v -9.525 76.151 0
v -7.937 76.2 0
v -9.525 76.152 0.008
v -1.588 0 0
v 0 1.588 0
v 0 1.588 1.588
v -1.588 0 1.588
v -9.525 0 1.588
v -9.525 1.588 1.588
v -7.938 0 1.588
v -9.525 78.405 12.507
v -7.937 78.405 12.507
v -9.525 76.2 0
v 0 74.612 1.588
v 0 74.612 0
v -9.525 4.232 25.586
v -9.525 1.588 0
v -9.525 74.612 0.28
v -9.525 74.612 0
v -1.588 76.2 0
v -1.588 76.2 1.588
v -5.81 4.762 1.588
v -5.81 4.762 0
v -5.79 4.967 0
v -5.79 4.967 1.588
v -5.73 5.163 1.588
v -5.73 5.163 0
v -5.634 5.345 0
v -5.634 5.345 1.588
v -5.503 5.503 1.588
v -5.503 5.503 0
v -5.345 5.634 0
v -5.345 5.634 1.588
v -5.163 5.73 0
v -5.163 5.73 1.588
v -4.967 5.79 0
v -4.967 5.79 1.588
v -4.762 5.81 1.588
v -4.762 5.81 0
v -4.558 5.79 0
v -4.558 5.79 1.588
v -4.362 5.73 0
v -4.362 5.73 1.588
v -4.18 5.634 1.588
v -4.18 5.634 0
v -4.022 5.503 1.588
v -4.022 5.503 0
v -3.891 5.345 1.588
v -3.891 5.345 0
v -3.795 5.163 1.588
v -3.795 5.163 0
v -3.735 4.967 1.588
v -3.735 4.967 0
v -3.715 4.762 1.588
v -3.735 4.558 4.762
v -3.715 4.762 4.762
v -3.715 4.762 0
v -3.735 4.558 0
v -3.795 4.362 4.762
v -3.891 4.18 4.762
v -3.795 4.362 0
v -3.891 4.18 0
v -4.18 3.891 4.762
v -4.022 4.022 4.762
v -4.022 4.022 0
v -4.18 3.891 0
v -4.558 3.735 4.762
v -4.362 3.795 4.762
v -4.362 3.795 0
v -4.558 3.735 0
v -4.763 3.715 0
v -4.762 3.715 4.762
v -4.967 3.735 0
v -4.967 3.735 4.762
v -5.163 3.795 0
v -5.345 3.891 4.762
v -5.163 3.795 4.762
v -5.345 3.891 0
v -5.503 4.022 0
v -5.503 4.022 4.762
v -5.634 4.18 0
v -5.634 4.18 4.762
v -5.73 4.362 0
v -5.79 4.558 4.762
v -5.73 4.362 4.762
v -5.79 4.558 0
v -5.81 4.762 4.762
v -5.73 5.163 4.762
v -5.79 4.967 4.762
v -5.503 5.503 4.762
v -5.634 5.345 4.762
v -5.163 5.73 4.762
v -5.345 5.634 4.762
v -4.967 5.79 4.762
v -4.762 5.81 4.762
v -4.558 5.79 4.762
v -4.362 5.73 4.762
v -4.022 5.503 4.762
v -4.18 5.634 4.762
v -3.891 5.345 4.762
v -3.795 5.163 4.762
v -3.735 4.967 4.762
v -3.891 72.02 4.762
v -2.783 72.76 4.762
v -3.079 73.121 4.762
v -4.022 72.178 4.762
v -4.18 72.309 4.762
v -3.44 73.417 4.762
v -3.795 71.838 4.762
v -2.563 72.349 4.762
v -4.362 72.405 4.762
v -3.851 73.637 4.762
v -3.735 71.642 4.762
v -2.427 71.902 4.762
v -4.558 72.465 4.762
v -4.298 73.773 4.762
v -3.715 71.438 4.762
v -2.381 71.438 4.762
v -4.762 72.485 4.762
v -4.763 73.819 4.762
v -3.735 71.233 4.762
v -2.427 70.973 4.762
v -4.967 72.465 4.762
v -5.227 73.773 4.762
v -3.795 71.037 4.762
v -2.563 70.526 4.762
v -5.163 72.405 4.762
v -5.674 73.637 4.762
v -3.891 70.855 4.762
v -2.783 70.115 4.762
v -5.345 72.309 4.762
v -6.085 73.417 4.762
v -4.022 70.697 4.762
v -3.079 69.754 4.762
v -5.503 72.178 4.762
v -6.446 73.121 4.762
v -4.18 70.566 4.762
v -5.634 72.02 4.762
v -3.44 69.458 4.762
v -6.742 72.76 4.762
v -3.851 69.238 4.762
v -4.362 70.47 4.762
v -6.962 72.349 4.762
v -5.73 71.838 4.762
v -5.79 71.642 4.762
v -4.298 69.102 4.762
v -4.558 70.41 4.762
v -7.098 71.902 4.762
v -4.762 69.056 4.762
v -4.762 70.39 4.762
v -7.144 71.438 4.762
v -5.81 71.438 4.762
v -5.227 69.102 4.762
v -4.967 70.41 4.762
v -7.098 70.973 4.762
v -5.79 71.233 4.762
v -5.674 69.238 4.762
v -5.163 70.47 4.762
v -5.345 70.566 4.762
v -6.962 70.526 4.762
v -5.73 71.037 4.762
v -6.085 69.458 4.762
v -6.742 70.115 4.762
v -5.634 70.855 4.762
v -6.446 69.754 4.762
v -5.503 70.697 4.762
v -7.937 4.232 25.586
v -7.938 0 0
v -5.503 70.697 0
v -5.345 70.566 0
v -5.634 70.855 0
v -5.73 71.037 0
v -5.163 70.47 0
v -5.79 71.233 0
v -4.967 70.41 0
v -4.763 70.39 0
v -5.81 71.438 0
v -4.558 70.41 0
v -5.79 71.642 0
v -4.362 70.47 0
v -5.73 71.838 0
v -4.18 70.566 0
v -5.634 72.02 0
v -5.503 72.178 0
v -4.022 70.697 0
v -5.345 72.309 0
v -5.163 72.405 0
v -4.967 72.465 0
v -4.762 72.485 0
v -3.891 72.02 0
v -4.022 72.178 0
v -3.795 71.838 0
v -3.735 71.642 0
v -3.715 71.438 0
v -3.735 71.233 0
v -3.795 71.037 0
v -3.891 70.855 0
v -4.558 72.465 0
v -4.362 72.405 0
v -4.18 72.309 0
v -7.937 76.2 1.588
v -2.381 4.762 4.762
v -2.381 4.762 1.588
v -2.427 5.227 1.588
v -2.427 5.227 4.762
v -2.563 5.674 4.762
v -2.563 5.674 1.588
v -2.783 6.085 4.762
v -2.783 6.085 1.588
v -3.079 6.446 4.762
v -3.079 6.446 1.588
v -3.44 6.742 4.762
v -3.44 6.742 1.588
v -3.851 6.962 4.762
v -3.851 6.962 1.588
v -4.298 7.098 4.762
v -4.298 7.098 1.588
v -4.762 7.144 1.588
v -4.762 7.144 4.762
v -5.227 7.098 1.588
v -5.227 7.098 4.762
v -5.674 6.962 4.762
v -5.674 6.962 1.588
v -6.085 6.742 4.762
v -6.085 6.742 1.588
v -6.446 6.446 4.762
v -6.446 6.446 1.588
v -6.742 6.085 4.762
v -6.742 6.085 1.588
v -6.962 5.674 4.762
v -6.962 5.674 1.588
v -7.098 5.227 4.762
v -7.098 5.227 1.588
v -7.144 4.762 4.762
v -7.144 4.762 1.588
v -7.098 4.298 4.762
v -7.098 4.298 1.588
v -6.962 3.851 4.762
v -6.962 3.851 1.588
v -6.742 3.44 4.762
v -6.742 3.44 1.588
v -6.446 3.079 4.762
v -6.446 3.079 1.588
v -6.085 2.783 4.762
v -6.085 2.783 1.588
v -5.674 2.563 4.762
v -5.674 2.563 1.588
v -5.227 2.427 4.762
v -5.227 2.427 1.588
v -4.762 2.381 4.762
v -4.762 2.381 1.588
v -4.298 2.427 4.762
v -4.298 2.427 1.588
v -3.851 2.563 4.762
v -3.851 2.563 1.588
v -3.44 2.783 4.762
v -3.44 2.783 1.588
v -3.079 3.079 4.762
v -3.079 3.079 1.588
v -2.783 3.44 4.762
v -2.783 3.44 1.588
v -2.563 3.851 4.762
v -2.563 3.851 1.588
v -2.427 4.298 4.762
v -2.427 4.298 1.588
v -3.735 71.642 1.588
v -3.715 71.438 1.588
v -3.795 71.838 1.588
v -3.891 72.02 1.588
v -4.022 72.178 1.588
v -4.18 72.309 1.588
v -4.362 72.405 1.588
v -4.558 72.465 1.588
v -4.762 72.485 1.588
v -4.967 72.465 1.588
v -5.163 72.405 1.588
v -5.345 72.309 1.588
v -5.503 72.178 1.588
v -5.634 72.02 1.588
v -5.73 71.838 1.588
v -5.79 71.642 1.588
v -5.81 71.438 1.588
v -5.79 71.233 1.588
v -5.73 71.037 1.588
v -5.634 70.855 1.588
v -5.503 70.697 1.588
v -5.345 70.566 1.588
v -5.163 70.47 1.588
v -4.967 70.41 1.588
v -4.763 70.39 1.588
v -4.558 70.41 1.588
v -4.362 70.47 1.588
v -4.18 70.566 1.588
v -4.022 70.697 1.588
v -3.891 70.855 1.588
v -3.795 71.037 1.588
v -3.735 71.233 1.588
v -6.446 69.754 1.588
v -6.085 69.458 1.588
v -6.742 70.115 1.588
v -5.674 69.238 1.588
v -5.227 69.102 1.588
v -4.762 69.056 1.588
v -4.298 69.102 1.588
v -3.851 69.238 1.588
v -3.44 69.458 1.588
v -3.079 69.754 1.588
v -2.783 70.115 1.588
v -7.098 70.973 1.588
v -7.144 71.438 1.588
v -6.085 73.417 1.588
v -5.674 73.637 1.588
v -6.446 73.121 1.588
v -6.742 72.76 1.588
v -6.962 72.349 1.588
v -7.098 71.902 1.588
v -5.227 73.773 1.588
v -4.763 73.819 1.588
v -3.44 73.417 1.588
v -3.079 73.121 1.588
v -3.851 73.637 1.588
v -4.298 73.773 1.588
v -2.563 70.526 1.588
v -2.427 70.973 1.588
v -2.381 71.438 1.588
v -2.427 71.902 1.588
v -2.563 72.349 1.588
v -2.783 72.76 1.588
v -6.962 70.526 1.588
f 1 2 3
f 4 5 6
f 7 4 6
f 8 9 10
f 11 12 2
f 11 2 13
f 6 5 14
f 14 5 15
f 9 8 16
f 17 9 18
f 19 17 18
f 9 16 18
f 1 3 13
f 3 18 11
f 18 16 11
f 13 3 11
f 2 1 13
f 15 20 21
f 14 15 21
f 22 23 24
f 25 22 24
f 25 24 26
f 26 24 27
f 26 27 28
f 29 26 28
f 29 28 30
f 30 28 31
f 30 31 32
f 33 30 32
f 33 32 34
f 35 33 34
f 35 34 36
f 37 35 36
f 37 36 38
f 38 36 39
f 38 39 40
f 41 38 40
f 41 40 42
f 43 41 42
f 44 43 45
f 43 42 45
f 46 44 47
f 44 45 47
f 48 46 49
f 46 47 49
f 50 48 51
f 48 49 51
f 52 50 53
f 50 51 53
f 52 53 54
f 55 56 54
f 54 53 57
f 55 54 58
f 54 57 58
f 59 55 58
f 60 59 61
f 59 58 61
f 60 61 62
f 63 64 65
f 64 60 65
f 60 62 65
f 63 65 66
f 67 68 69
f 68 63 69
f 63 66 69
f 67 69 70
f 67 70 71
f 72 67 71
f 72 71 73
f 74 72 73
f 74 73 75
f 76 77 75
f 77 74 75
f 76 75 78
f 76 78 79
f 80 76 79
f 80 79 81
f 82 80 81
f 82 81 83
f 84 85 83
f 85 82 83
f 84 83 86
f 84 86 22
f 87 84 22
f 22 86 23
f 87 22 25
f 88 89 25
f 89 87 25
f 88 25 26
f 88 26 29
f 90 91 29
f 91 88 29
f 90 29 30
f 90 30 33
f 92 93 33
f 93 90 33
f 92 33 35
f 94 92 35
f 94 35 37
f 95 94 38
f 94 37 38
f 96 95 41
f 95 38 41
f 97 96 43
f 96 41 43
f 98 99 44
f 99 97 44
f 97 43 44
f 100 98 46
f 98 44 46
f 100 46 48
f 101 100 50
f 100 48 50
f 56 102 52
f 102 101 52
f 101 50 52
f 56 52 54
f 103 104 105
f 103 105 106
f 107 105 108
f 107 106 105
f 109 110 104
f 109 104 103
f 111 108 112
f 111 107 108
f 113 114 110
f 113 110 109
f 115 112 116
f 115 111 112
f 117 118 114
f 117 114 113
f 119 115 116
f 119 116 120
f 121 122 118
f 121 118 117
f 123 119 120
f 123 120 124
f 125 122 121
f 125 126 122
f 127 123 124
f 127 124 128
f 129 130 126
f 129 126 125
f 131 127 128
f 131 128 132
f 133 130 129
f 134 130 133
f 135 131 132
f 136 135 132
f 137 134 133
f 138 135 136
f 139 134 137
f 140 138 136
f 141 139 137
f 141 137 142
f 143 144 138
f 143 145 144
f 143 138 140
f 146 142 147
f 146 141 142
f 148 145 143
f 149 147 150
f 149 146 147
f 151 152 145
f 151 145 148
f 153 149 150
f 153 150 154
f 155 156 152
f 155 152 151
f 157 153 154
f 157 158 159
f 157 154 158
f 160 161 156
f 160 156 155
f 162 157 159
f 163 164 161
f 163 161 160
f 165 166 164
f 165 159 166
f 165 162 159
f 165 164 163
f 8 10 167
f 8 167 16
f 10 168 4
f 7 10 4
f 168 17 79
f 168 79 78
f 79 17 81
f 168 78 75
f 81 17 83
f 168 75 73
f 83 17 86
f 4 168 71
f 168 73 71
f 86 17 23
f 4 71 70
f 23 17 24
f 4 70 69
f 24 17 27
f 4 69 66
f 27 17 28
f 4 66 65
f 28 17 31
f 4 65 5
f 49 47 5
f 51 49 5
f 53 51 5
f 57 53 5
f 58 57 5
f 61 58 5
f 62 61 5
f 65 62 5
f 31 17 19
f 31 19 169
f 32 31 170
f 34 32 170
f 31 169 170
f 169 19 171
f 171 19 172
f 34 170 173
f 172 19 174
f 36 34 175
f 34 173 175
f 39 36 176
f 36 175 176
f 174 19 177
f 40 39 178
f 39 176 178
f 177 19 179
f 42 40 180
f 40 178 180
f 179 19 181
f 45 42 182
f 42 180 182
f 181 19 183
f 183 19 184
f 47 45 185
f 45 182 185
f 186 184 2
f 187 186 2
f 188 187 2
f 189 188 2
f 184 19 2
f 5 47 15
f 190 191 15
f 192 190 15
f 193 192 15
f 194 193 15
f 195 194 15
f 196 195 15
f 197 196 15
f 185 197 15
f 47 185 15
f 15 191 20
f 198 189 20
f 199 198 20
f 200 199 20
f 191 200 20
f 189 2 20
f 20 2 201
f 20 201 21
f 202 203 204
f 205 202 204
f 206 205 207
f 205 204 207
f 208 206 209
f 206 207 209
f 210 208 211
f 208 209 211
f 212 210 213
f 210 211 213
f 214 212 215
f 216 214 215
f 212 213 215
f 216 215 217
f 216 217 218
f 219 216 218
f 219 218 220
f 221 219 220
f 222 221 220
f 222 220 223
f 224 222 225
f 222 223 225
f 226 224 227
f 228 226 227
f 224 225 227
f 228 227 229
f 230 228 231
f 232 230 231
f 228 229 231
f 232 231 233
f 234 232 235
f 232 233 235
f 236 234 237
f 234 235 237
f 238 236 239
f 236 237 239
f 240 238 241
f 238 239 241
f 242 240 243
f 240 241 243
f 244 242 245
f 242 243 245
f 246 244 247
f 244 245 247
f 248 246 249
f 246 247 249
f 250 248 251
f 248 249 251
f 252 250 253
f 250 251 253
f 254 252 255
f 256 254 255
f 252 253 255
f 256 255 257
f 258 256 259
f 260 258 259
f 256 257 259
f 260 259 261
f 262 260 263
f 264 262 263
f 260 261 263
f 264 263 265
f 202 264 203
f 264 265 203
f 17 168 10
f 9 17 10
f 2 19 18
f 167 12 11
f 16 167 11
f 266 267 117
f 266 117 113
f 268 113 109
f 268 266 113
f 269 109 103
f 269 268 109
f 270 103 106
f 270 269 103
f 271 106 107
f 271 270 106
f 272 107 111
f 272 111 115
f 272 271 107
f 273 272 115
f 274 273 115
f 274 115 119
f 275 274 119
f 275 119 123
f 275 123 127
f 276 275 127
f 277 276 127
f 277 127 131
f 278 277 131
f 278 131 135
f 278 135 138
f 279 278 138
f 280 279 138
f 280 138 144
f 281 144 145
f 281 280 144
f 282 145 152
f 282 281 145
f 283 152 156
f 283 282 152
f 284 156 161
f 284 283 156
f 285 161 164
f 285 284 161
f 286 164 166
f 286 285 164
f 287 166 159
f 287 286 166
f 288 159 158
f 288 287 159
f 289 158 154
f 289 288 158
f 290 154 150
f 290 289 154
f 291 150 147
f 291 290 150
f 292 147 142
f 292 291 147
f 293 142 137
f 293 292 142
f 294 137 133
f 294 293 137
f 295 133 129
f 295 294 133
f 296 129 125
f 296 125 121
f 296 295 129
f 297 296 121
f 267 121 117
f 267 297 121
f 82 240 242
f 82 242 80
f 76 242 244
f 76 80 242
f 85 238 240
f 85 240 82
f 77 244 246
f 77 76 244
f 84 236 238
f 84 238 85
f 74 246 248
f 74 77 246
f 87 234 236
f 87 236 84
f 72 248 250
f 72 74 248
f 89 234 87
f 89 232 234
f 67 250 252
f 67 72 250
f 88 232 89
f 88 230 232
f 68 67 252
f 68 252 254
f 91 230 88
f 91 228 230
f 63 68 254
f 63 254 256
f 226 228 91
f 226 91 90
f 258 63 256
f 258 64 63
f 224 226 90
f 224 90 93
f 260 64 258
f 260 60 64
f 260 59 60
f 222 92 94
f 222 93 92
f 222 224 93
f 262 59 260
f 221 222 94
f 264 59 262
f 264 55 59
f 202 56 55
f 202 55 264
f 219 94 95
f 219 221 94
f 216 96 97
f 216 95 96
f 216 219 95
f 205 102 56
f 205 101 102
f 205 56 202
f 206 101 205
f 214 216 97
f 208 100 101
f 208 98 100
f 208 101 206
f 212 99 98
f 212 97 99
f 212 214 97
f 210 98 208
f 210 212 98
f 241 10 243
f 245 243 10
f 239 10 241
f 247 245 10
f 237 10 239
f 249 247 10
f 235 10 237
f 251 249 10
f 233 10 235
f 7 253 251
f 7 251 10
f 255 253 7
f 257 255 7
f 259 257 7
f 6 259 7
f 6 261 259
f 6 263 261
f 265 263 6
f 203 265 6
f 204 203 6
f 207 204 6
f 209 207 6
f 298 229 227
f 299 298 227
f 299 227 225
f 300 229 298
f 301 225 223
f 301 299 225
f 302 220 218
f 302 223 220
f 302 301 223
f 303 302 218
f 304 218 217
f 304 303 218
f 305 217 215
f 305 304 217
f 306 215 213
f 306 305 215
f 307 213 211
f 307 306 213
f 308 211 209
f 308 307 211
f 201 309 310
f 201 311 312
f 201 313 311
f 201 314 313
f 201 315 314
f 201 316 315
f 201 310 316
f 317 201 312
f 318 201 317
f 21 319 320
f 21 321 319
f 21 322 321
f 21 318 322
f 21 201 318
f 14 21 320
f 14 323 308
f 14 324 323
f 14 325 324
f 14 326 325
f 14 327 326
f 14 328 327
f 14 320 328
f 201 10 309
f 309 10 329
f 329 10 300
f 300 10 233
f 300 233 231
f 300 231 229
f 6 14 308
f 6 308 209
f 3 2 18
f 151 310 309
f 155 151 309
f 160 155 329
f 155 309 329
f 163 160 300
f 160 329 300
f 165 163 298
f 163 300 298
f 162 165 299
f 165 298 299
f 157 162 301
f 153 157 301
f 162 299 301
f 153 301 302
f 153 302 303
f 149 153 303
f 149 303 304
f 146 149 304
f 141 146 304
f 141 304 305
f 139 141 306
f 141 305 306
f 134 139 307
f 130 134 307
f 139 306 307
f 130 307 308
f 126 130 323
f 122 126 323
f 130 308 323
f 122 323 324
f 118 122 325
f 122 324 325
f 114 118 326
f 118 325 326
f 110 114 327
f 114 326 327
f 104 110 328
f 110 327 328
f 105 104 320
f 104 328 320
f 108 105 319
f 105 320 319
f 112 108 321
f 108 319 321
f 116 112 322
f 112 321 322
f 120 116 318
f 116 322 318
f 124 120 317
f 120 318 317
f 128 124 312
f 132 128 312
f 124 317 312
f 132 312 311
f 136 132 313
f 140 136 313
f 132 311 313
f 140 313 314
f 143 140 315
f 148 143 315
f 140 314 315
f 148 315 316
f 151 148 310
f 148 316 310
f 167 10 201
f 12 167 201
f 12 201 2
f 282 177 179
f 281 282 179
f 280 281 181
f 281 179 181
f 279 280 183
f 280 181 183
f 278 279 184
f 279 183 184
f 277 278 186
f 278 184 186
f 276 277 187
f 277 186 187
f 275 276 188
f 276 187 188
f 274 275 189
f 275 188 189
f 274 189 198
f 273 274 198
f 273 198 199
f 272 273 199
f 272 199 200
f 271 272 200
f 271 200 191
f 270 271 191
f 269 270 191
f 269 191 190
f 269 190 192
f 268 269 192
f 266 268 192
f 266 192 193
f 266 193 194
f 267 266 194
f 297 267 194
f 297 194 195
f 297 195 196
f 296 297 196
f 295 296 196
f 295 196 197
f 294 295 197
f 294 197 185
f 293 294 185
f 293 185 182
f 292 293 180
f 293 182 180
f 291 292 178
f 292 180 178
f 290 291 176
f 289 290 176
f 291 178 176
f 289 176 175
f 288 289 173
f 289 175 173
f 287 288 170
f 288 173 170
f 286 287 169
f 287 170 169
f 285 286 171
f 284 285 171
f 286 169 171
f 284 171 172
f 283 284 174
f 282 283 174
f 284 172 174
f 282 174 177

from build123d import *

# Parameters (mm, degrees)
SKETCH1_W                       = 9.525
SKETCH1_H                       = 76.2
BOSS_EXTRUDE1_DEPTH             = 1.5875
CHAMFER2_SIZE                   = 1.5875
F_97_0_0825_DIAMETER_HOLE1_D    = 2.0955
SKETCH5_R                       = 2.38125
SKETCH5_R_2                     = 1.04775
BOSS_EXTRUDE2_DEPTH             = 3.175
BOSS_EXTRUDE4_REACH             = 77.644
SKETCH7_W                       = 1.5875
SKETCH7_H                       = 75.318017262
BOSS_EXTRUDE4_DIRECTION_2_DEPTH = 12.7
BOSS_EXTRUDE5_REACH             = 79.8


with BuildPart() as part:
    # Sketch1 → Boss-Extrude1 (new body)
    with BuildSketch(Plane.XY):
        with Locations((-4.7625, 38.1)):
            Rectangle(SKETCH1_W, SKETCH1_H)
    extrude(amount=BOSS_EXTRUDE1_DEPTH)

    # Chamfer2
    chamfer2_edges = [part.edges().sort_by_distance(p)[0] for p in [
        (0, 76.2, 0.79375),
        (-9.525, 76.2, 0.79375),
        (0, 0, 0.79375),
        (-9.525, 0, 0.79375),
    ]]
    chamfer(chamfer2_edges, length=CHAMFER2_SIZE)

    # #97 (0.0825) Diameter Hole1 (through all)
    with Locations(Plane.XY.offset(1.5875)):
        with Locations((-4.7625, 4.7625), (-4.7625, 71.4375)):
            Hole(F_97_0_0825_DIAMETER_HOLE1_D / 2)

    # Sketch5 → Boss-Extrude2 (add)
    # profile 1 of 2: a face of its own
    with BuildSketch(Plane.XY.offset(1.5875)):
        with Locations((-4.7625, 4.7625)):
            Circle(SKETCH5_R)
        with Locations((-4.7625, 4.7625)):
            Circle(SKETCH5_R_2, mode=Mode.SUBTRACT)
    # profile 2 of 2: a face of its own
    with BuildSketch(Plane.XY.offset(1.5875)):
        with Locations((-4.7625, 71.4375)):
            Circle(SKETCH5_R)
        with Locations((-4.7625, 71.4375)):
            Circle(SKETCH5_R_2, mode=Mode.SUBTRACT)
    extrude(amount=BOSS_EXTRUDE2_DEPTH)

    # Boss-Extrude4: up to this face of the body (flat: up to its plane)
    boss_extrude4_end = Plane(part.part.faces().sort_by_distance((-4.7625, 38.1, 1.5875))[0])
    # Sketch7 → Boss-Extrude4 (add, up to the picked face)
    with BuildSketch(Plane(origin=(0, 2.297711148, 13.030967461), x_dir=(-1, 0, 0), z_dir=(0, -0.1736481776669307, -0.984807753012208)), mode=Mode.PRIVATE) as boss_extrude4_sk1:
        with Locations((8.73125, 37.383342149)):
            Rectangle(SKETCH7_W, SKETCH7_H)
    boss_extrude4_tool1 = split(extrude(boss_extrude4_sk1.sketch, amount=BOSS_EXTRUDE4_REACH, mode=Mode.PRIVATE), bisect_by=boss_extrude4_end, keep=Keep.BOTH, mode=Mode.PRIVATE)
    add(boss_extrude4_tool1.solids().sort_by(Axis((-8.73125, 39.113116, 6.539418), (0, -0.1736481776669307, -0.984807753012208)))[0])

    # Sketch7 → Boss-Extrude4 direction 2 (add)
    with BuildSketch(Plane(origin=(0, 2.297711148, 13.030967461), x_dir=(-1, 0, 0), z_dir=(0, -0.1736481776669307, -0.984807753012208))):
        with Locations((8.73125, 37.383342149)):
            Rectangle(SKETCH7_W, SKETCH7_H)
    extrude(amount=-BOSS_EXTRUDE4_DIRECTION_2_DEPTH)

    # Boss-Extrude5: up to this face of the body (flat: up to its plane)
    boss_extrude5_end = Plane(part.part.faces().sort_by_distance((-4.7625, 38.1, 0))[0])
    # Sketch8 → Boss-Extrude5 (add, up to the picked face)
    with BuildSketch(Plane(origin=(0, 2.297711148, 13.030967461), x_dir=(-1, 0, 0), z_dir=(0, -0.17364817766693066, -0.9848077530122081)), mode=Mode.PRIVATE) as boss_extrude5_sk1:
        Polygon((9.525, 74.993743341), (9.525, 75.04235078), (7.9375, 75.04235078), align=None)
    boss_extrude5_tool1 = split(extrude(boss_extrude5_sk1.sketch, amount=BOSS_EXTRUDE5_REACH, mode=Mode.PRIVATE), bisect_by=boss_extrude5_end, keep=Keep.BOTH, mode=Mode.PRIVATE)
    add(boss_extrude5_tool1.solids().sort_by(Axis((-8.995833, 76.184044, 0.002814), (0, -0.17364817766693066, -0.9848077530122081)))[0])


solid = part.part
